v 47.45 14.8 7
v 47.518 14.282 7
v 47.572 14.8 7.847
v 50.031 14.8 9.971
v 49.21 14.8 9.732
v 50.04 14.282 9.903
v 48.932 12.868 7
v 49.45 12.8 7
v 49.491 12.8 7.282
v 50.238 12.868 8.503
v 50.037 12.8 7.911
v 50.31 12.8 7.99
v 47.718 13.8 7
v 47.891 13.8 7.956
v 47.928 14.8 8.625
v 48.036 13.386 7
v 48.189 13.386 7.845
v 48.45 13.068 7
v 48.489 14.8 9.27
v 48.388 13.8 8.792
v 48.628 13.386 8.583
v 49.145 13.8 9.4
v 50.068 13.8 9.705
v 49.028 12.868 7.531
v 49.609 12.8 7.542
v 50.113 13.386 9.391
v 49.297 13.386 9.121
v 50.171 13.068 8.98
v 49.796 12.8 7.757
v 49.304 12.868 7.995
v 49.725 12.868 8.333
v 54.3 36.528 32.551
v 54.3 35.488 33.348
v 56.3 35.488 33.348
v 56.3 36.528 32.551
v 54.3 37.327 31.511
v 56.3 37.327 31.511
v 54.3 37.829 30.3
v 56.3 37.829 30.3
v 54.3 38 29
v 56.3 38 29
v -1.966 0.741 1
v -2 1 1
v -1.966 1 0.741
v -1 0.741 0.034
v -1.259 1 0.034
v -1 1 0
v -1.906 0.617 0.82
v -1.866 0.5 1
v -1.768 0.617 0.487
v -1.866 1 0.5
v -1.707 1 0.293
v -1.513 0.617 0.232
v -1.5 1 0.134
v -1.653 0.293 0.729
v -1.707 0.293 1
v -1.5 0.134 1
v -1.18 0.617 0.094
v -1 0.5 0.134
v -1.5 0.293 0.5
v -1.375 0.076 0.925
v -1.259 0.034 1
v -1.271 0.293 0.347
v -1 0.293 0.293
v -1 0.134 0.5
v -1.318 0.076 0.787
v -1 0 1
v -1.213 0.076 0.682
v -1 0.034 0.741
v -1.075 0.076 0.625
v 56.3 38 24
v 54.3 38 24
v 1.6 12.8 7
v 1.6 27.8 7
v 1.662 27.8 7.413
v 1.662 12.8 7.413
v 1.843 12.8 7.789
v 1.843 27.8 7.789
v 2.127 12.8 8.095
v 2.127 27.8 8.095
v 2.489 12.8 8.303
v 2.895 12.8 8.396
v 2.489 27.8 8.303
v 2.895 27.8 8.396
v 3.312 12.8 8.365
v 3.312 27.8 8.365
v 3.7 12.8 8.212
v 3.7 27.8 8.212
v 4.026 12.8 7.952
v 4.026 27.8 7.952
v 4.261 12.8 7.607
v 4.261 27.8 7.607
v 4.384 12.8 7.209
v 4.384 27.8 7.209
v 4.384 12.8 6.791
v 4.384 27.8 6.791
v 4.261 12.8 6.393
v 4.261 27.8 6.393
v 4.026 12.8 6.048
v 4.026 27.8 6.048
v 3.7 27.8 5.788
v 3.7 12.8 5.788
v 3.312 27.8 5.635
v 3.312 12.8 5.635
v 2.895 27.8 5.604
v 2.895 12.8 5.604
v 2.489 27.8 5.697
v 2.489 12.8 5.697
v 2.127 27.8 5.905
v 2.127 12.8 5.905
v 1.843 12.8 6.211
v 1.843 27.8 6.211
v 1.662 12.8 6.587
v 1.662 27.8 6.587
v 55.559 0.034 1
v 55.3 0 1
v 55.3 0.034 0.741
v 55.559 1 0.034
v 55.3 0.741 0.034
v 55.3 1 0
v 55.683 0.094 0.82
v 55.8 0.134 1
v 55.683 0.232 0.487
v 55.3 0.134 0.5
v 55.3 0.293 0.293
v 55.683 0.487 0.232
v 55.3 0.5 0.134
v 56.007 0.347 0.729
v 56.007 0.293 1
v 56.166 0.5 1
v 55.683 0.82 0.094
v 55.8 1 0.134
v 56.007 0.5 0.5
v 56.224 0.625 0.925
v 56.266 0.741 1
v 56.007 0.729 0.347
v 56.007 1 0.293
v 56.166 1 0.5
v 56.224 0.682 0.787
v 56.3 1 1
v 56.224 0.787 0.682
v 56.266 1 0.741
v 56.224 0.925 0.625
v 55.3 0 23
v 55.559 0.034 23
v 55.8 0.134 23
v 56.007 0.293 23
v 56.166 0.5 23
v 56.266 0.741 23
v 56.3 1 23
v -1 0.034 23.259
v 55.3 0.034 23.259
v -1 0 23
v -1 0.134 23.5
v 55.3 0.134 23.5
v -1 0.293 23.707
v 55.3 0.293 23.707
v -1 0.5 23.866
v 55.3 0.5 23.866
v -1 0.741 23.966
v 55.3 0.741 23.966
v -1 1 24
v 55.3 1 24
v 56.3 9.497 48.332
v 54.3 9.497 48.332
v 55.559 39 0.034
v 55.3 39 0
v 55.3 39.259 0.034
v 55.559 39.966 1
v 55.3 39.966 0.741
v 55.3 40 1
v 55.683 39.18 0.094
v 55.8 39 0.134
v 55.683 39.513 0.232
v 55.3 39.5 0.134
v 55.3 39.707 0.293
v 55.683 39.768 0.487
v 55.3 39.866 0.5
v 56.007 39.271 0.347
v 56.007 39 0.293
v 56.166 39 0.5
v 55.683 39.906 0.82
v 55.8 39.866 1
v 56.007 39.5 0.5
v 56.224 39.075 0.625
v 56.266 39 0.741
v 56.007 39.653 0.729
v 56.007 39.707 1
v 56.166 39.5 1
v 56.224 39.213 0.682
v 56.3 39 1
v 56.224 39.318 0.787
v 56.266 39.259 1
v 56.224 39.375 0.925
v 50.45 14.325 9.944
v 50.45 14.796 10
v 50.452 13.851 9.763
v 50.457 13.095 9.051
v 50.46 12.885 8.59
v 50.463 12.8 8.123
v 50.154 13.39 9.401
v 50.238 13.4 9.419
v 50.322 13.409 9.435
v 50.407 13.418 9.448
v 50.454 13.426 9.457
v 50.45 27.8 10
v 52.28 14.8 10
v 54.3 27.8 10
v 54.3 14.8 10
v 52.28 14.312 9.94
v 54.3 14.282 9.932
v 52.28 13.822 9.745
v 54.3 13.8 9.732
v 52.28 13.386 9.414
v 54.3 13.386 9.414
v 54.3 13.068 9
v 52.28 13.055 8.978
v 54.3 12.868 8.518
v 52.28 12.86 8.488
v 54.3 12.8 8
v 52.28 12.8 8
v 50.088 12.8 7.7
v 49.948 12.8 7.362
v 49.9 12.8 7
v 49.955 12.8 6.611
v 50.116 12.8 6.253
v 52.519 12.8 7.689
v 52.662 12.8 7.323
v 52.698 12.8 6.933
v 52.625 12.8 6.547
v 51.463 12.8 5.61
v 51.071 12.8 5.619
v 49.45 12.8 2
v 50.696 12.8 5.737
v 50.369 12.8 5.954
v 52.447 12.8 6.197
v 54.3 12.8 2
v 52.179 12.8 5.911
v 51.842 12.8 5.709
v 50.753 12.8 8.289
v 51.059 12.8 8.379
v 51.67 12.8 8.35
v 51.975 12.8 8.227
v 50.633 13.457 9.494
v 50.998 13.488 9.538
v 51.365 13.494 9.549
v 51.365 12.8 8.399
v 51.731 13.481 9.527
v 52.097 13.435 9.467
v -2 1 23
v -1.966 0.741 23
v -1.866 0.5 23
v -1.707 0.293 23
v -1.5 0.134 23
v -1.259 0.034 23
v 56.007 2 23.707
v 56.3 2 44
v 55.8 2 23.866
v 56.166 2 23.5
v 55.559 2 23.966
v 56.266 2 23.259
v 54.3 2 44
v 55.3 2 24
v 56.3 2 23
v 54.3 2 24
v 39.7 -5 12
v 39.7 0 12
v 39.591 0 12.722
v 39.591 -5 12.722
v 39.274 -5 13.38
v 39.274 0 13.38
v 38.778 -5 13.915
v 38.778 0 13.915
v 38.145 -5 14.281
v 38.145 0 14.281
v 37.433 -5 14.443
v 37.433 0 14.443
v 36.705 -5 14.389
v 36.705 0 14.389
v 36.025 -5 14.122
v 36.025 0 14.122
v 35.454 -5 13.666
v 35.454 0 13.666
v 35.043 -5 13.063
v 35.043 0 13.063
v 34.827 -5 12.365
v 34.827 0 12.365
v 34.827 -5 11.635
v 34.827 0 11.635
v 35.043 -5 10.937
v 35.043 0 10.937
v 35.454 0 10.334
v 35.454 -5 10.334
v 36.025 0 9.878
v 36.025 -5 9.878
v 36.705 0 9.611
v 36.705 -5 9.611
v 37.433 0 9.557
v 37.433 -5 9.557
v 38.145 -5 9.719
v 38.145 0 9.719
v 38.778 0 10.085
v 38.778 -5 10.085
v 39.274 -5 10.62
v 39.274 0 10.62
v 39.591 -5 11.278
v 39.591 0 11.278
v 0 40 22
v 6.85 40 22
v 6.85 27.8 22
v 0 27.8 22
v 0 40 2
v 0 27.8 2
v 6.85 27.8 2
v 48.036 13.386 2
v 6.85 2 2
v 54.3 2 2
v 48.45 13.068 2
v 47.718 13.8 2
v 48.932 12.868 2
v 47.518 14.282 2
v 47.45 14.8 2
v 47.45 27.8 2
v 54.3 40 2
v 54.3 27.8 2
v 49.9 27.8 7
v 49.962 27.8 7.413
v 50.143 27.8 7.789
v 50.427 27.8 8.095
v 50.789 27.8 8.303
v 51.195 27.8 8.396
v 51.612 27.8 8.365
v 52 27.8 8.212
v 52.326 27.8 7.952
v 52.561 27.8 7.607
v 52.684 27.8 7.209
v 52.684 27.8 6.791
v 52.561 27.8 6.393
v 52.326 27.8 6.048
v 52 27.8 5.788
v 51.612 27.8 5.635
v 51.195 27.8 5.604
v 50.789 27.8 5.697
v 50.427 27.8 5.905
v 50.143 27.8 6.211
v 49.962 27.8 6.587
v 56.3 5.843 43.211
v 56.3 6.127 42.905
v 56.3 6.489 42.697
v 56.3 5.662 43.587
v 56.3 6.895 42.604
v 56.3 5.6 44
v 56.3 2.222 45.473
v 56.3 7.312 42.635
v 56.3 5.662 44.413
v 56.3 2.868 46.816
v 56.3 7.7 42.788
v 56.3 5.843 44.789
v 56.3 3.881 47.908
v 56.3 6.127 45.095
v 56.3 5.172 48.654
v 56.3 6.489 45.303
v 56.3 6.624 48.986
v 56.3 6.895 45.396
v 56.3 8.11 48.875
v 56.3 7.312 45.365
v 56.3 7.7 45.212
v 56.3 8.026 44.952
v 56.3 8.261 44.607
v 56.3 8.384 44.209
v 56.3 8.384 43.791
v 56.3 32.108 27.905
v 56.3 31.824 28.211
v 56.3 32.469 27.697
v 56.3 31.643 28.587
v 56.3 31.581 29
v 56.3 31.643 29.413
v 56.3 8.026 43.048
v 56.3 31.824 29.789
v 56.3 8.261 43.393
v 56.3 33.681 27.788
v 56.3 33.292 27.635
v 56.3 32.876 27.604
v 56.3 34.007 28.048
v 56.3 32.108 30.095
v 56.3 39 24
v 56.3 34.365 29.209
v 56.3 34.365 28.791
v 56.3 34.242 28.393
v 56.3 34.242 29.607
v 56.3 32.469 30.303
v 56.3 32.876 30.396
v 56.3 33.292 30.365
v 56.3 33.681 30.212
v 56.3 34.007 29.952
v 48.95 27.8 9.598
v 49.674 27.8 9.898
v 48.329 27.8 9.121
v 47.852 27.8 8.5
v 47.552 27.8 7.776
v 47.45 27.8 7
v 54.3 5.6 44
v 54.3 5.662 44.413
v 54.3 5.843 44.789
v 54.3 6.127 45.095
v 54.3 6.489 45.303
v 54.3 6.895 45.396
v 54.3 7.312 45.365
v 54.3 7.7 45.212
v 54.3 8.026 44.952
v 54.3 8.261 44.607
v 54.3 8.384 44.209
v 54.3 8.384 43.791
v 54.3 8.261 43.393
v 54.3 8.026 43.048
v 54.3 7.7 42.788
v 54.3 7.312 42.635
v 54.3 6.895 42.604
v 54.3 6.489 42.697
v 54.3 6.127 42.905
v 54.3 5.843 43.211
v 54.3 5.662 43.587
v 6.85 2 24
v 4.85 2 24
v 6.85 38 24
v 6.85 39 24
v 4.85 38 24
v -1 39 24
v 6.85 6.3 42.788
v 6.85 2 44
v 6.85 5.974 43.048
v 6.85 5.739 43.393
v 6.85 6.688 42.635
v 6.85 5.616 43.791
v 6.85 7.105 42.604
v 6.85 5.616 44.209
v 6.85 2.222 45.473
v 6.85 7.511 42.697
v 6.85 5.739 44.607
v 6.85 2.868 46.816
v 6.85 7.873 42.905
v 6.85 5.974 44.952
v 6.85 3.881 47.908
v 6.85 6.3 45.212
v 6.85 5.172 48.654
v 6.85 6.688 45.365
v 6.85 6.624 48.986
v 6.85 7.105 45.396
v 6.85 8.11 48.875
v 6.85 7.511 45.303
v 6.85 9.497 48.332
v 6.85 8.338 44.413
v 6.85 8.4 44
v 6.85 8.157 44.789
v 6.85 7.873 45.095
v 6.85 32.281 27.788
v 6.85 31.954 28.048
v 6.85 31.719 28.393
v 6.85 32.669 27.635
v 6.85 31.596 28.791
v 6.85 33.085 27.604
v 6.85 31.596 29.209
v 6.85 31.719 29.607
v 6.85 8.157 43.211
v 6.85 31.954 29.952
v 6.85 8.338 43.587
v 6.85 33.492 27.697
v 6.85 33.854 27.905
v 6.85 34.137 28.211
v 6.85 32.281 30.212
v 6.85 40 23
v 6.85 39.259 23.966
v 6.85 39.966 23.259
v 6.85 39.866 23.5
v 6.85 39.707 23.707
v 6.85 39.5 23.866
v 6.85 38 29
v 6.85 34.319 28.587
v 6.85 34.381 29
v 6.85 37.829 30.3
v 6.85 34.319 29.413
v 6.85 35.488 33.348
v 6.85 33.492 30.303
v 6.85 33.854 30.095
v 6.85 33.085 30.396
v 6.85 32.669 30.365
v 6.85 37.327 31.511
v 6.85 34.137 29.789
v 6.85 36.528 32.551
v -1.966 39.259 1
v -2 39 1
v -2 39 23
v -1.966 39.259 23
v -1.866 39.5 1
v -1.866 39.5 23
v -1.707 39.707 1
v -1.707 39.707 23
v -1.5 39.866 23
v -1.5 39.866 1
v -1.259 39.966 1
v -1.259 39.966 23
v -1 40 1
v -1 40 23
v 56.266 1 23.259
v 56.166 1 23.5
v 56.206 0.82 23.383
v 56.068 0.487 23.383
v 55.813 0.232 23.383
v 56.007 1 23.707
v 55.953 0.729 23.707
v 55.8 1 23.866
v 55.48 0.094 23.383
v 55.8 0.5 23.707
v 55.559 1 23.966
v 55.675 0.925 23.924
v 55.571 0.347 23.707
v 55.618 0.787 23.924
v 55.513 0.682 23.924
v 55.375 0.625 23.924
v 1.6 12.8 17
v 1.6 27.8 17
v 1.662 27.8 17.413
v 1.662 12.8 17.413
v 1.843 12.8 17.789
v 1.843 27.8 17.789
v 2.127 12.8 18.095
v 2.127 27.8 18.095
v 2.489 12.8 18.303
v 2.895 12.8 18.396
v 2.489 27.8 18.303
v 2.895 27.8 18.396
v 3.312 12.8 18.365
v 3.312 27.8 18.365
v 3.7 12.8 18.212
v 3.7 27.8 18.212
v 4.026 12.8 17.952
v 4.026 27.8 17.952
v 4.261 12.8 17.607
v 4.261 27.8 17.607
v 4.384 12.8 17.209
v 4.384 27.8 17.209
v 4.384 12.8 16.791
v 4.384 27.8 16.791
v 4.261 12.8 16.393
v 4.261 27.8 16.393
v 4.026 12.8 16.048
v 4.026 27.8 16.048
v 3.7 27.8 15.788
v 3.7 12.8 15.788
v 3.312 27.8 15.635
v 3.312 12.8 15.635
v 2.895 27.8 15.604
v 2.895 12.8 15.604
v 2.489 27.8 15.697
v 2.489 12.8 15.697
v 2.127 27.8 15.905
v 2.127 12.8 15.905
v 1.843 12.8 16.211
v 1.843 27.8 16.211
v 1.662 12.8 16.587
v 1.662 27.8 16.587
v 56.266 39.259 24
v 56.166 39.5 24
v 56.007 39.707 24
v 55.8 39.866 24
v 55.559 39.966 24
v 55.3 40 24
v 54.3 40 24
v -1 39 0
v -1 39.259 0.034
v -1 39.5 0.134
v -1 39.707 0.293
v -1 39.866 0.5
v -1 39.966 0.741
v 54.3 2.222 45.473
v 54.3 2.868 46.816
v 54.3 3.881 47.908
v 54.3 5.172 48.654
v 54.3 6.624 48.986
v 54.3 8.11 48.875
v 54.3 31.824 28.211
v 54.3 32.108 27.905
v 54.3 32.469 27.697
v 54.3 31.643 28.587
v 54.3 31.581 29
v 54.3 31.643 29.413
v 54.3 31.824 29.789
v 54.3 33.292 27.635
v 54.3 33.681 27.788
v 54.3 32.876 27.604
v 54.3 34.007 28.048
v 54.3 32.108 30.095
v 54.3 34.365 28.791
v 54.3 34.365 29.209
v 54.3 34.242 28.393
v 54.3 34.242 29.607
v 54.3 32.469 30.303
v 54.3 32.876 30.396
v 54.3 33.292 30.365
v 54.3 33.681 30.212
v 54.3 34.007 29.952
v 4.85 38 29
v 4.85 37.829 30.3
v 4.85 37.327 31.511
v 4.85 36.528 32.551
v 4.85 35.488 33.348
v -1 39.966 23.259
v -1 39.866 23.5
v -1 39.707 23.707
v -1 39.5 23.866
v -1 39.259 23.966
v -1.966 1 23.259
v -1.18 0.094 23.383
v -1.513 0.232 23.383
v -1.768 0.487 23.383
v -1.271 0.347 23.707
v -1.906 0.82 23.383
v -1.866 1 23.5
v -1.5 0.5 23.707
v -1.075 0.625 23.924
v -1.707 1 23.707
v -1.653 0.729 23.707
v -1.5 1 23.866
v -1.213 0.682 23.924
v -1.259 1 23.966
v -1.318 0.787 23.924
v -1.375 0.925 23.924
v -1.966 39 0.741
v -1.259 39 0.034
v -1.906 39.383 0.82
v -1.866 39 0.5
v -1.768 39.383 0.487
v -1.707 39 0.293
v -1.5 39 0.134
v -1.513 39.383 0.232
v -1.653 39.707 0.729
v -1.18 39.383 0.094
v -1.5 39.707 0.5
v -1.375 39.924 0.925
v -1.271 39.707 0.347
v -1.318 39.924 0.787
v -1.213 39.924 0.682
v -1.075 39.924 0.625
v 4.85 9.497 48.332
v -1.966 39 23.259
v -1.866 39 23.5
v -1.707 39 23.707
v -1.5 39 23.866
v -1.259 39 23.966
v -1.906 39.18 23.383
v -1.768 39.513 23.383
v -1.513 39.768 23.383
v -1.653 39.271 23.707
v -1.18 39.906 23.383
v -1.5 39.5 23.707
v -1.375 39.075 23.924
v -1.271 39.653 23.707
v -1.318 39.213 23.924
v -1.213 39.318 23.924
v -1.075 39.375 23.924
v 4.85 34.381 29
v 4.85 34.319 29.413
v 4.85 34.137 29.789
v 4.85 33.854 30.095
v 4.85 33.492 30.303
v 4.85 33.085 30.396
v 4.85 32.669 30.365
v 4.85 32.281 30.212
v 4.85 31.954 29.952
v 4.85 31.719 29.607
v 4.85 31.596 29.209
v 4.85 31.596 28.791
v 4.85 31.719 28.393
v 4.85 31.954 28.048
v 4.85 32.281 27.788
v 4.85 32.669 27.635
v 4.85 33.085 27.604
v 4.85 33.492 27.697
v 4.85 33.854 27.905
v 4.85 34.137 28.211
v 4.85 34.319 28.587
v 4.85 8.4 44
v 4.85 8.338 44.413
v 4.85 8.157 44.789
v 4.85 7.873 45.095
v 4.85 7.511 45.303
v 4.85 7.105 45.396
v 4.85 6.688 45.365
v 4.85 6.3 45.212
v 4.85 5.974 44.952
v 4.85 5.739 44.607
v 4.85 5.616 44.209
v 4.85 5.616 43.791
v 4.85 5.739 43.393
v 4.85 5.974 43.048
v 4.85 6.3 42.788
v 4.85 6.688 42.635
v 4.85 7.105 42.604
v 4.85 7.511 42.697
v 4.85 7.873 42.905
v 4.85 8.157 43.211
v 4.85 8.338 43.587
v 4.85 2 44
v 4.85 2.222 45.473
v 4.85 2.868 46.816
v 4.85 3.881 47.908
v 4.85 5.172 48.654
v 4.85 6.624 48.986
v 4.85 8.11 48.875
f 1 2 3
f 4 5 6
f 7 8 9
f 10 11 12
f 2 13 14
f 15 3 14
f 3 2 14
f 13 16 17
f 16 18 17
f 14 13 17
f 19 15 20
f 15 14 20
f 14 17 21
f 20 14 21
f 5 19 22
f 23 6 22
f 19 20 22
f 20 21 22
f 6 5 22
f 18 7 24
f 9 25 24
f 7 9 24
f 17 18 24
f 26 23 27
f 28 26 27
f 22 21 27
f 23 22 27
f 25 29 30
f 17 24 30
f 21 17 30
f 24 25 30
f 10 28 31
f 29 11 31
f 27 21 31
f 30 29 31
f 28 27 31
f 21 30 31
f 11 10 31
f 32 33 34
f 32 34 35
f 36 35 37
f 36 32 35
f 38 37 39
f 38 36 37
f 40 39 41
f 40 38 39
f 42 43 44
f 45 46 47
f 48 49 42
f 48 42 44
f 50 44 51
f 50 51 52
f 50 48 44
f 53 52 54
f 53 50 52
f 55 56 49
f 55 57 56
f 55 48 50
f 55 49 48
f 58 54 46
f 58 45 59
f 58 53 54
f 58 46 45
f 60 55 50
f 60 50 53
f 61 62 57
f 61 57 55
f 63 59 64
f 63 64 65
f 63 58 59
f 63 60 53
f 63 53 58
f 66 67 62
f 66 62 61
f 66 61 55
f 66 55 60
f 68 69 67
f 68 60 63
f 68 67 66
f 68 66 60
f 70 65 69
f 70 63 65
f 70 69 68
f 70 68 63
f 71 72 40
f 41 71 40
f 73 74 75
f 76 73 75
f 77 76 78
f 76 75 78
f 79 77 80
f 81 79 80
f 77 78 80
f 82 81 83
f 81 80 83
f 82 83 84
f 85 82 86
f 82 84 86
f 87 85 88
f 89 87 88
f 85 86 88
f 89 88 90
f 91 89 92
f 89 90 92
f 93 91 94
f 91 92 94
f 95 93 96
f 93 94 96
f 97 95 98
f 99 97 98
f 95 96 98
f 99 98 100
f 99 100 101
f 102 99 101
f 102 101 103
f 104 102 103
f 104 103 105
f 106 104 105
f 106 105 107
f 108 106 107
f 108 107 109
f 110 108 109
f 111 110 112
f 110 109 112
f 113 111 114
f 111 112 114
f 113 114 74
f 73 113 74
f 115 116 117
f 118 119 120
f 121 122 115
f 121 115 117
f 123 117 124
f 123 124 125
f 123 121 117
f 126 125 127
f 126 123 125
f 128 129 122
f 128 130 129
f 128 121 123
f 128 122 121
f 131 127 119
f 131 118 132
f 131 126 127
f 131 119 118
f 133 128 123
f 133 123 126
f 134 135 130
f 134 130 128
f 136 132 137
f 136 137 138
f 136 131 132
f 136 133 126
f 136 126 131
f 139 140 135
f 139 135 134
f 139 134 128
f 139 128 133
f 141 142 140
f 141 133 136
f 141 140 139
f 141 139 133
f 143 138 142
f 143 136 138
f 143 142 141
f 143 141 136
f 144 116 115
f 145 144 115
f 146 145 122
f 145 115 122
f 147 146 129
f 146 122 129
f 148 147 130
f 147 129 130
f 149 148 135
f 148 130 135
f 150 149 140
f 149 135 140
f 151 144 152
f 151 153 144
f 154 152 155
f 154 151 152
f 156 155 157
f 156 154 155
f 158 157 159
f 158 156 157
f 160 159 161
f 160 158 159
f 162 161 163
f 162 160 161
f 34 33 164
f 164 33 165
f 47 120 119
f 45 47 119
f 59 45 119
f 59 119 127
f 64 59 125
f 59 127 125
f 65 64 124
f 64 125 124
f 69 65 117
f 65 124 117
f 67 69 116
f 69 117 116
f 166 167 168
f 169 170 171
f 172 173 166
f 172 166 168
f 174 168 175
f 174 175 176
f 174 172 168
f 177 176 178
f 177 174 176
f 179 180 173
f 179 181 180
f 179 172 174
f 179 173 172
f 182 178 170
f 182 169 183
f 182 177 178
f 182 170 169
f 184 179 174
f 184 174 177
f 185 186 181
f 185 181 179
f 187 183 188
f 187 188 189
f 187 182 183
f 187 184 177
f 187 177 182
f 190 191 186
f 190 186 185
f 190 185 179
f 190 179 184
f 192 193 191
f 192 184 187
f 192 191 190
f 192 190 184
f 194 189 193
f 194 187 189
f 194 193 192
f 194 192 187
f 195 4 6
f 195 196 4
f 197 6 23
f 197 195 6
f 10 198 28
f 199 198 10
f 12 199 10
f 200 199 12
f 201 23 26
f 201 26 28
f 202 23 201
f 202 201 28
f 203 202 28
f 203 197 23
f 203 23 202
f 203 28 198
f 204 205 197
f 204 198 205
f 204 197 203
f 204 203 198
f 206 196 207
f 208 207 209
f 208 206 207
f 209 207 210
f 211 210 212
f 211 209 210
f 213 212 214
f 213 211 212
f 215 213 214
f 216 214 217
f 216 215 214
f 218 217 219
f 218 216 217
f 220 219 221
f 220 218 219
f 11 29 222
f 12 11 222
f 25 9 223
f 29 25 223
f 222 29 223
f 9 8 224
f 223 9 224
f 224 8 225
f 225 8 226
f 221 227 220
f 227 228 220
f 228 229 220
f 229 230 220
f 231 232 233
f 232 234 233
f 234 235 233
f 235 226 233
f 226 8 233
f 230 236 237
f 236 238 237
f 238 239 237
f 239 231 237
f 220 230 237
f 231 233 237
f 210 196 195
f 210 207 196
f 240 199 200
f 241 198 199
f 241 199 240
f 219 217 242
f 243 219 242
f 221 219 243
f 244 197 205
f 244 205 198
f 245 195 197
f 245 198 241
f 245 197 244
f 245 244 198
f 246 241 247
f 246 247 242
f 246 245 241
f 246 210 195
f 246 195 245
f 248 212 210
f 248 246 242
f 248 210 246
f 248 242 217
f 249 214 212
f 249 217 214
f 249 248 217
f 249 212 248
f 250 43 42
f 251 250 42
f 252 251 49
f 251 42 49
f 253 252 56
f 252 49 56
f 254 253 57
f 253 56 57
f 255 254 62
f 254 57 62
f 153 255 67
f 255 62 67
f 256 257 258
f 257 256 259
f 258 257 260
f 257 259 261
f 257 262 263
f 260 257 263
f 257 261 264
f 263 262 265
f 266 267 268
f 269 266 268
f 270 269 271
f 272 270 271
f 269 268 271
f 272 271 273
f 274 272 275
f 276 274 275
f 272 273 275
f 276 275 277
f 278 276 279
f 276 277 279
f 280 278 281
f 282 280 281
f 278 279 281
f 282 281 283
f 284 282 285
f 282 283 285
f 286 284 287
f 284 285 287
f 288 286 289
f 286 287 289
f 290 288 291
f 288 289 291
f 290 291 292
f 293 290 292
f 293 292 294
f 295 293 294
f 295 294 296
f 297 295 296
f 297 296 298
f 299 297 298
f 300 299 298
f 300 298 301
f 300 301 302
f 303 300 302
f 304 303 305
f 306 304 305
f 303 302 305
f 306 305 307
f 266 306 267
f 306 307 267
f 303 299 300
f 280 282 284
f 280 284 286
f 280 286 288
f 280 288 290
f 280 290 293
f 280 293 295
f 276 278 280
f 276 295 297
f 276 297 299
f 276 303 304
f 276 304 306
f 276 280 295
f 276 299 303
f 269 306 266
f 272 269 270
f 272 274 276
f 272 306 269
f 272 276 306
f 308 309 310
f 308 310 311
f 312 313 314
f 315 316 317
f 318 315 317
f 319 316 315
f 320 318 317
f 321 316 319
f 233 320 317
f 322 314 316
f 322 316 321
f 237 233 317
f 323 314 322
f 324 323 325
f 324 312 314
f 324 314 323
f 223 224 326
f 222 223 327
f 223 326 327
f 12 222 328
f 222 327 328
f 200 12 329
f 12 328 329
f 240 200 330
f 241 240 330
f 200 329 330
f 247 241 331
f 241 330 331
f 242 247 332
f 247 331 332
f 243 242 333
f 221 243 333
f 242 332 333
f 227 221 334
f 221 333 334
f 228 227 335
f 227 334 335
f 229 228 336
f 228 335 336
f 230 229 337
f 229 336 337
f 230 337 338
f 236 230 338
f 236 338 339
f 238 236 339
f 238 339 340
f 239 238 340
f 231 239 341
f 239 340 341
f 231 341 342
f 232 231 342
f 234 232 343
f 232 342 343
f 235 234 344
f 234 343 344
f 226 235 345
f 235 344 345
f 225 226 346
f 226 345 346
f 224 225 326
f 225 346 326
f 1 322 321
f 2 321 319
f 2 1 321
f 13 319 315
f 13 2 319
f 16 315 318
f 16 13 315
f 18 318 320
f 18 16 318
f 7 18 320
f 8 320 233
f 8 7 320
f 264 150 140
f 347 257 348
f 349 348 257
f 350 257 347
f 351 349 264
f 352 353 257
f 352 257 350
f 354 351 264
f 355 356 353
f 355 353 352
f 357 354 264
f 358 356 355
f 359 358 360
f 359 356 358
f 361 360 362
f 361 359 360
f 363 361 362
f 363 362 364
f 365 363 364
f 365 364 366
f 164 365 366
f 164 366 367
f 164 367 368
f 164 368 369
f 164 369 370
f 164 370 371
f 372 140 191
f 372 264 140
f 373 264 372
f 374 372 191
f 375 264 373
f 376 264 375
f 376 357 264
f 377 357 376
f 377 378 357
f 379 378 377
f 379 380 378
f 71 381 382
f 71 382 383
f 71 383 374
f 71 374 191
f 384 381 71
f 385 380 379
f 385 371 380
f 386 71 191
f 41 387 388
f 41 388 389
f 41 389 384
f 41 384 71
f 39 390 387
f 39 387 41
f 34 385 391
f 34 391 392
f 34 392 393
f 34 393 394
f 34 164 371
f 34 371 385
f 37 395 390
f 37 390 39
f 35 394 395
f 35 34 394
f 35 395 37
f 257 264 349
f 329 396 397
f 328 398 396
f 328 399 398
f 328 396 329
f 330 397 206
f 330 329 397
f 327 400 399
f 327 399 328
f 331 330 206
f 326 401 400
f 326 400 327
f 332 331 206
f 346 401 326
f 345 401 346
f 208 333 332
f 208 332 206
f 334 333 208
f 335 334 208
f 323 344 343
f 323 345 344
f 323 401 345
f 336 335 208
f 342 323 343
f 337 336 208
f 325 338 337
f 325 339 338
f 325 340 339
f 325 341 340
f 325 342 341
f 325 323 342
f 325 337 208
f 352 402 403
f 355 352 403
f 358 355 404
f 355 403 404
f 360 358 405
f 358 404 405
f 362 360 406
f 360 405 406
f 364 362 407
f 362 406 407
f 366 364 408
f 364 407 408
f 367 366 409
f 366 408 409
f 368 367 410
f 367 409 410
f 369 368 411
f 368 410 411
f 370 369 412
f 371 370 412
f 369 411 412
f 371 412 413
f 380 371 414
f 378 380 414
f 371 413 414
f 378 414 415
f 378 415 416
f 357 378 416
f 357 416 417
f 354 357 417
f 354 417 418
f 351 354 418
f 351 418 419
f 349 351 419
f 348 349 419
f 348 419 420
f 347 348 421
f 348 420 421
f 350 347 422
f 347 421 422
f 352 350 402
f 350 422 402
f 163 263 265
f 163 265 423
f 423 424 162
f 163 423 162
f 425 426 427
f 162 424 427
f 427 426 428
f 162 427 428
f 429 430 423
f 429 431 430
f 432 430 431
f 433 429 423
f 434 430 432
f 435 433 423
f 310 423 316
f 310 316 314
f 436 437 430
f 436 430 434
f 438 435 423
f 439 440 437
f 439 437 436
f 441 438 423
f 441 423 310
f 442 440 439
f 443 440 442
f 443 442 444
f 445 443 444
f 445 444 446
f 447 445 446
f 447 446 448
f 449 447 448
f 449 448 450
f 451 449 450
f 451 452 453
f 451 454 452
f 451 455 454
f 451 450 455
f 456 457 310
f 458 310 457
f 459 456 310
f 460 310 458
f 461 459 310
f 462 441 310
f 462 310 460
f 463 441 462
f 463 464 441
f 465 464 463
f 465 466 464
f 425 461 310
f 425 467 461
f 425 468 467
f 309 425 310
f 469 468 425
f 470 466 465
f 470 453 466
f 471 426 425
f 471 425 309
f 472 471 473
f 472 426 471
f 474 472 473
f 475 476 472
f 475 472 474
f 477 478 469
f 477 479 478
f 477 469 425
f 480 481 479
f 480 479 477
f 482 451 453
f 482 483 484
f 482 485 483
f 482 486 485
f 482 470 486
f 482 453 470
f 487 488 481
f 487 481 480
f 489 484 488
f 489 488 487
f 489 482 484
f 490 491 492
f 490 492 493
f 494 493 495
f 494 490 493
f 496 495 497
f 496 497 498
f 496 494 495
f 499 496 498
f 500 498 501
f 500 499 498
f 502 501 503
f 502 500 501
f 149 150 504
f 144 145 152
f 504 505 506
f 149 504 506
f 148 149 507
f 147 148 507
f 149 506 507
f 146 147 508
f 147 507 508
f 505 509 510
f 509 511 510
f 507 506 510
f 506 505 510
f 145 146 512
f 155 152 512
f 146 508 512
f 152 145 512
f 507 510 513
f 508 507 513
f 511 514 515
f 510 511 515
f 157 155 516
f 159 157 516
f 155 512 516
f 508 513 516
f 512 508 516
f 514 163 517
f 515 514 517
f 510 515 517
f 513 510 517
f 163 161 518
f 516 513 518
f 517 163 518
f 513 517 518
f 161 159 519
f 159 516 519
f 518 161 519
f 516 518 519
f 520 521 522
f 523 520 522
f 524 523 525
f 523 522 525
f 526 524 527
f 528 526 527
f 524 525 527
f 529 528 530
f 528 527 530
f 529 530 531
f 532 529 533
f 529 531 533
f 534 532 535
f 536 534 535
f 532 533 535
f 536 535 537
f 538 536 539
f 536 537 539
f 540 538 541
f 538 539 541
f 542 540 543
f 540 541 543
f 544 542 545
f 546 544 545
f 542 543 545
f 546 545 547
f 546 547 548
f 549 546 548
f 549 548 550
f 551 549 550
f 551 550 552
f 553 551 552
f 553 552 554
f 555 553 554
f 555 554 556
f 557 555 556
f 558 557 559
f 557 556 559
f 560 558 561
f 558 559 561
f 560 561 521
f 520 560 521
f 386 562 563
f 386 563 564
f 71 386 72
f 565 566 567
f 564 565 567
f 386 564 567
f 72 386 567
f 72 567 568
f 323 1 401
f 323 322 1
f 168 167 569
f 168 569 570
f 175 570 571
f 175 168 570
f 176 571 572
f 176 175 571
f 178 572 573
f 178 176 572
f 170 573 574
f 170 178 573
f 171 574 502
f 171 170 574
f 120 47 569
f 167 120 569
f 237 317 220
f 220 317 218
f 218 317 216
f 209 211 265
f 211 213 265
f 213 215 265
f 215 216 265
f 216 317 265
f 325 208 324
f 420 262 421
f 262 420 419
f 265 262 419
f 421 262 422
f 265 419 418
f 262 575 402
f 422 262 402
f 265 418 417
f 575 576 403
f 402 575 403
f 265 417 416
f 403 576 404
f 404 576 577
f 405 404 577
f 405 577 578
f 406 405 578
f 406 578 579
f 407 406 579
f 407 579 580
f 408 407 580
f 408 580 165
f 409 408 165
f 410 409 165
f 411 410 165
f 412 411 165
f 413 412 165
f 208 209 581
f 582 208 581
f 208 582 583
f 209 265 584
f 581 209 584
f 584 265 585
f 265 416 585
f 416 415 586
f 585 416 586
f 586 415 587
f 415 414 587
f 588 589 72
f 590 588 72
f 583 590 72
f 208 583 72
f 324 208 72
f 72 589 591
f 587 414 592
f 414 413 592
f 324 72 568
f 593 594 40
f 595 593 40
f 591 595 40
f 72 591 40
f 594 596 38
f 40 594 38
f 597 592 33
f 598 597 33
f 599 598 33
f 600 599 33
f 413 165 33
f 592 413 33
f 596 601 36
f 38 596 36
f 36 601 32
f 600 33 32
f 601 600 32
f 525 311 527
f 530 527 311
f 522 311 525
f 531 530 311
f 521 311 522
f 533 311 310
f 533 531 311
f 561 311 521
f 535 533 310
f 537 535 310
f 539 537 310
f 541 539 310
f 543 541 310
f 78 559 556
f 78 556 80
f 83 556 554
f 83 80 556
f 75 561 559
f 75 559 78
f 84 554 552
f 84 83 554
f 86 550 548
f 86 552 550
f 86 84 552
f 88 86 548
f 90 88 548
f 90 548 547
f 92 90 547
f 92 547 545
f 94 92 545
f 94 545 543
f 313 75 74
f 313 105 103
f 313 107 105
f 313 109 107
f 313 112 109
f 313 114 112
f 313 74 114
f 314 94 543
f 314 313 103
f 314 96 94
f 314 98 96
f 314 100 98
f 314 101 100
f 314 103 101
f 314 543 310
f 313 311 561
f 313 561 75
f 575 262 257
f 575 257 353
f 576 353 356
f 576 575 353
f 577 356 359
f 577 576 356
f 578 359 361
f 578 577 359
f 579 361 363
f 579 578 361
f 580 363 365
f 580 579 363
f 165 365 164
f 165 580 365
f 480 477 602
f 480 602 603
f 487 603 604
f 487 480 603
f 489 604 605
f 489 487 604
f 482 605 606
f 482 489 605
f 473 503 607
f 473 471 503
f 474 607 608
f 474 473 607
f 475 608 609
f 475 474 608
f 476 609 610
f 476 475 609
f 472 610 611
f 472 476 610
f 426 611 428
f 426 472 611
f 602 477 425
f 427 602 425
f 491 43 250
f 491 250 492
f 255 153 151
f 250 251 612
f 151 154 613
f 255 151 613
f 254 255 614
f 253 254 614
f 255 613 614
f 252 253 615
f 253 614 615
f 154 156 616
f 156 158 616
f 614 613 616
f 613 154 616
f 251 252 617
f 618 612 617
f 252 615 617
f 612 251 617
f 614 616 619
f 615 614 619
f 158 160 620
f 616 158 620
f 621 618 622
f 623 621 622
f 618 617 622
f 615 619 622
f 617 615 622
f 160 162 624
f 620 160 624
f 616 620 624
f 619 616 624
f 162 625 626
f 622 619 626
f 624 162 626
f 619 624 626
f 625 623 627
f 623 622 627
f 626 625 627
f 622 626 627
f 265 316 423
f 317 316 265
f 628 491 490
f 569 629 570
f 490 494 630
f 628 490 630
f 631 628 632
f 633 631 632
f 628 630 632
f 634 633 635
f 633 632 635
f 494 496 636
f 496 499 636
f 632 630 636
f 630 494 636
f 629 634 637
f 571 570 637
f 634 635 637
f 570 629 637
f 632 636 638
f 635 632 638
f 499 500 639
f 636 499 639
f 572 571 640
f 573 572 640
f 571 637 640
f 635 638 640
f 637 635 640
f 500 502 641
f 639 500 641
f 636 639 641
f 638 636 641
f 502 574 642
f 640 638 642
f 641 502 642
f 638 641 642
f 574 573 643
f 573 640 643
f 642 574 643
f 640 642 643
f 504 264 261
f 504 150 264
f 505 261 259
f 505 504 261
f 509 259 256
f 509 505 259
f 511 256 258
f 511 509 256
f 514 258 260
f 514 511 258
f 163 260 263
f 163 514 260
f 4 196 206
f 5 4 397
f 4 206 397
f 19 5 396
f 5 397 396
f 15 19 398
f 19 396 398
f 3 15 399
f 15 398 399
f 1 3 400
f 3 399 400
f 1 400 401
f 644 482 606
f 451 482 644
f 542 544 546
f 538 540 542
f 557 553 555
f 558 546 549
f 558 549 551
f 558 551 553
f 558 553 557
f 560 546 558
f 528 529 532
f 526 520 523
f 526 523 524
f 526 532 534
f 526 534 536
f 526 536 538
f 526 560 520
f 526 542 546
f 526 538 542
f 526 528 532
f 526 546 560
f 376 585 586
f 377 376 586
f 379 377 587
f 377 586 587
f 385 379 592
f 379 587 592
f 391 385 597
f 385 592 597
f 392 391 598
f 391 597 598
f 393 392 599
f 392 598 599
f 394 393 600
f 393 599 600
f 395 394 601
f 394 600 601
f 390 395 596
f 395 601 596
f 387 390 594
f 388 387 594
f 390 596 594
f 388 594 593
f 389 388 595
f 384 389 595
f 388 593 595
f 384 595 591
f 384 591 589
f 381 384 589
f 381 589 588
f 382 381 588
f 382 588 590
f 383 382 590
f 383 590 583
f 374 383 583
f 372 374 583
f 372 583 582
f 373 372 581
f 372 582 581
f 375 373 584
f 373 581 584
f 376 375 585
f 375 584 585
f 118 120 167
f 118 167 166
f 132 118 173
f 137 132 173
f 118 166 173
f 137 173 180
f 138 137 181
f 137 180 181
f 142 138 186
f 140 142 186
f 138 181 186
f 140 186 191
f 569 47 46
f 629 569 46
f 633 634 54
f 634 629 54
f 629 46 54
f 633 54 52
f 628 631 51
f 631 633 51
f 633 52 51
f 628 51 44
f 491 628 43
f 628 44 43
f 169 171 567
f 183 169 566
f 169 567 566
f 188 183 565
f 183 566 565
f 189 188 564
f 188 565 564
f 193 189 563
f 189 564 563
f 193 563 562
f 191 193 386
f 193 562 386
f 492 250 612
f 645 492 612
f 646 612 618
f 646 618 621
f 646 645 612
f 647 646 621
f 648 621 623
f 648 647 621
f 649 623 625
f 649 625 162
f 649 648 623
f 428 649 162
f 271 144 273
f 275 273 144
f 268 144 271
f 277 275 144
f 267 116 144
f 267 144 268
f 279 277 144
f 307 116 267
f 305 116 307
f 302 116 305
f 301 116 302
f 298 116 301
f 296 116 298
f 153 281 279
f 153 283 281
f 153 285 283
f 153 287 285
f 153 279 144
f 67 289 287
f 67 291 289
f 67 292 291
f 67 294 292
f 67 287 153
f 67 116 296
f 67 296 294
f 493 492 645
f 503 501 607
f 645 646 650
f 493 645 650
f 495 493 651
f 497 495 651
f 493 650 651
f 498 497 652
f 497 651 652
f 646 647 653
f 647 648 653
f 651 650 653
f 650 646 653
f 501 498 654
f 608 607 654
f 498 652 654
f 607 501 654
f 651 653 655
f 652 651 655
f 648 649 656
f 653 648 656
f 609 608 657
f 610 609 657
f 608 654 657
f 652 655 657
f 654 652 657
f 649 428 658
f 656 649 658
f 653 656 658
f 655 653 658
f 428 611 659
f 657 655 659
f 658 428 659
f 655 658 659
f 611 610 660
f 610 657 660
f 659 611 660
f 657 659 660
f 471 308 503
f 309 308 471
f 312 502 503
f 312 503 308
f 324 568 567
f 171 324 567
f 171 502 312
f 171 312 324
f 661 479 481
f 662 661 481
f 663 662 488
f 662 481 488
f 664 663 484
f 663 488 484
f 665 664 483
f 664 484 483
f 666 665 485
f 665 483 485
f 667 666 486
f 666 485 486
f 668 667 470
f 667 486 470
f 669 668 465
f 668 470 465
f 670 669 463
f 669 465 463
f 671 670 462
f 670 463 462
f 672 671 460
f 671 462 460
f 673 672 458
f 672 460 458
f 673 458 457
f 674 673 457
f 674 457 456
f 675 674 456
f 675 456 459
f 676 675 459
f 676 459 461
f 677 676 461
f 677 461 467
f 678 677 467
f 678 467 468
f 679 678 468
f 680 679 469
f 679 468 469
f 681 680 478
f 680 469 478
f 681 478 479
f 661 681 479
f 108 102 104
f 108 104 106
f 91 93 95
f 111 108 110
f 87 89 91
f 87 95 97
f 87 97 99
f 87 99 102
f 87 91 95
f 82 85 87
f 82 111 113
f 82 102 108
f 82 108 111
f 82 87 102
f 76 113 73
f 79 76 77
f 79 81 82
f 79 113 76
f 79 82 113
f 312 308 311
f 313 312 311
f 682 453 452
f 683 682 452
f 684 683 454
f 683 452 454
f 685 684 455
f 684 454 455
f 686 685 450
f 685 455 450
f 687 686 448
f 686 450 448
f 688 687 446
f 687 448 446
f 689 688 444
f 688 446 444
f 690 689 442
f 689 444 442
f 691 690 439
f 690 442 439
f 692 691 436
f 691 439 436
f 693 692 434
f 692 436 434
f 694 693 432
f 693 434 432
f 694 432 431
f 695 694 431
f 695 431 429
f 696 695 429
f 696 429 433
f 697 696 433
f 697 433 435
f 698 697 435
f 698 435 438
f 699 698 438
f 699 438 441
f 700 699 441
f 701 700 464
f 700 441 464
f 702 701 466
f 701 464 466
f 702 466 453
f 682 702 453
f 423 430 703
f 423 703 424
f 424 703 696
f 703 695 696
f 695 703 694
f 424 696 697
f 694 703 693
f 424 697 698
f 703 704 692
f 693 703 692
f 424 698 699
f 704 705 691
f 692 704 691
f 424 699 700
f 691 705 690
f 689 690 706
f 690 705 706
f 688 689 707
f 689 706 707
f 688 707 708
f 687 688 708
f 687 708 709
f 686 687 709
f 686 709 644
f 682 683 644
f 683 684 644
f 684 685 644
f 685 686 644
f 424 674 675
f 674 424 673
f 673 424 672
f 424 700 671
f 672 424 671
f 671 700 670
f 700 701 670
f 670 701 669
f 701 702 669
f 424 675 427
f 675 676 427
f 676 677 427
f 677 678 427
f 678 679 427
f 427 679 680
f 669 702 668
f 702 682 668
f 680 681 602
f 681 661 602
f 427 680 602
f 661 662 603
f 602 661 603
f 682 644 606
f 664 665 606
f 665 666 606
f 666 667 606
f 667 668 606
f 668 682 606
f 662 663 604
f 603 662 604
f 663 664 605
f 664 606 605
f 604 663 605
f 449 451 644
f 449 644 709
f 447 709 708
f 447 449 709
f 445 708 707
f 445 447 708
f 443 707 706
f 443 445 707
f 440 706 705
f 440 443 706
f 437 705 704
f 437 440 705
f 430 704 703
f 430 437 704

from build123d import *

# Parameters (mm, degrees)
SKETCH_W        = 54.3
SKETCH_H        = 38
PAD_DEPTH       = 2
SKETCH001_W     = 54.3
SKETCH001_H     = 2
PAD001_DEPTH    = 22
SKETCH002_R     = 2.45
PAD002_DEPTH    = 5
SKETCH003_W     = 40
SKETCH003_H     = 22
PAD003_DEPTH    = 2
SKETCH004_W     = 40
SKETCH004_H     = 22
PAD004_DEPTH    = 2
SKETCH005_W     = 6.85
SKETCH005_H     = 15
PAD005_DEPTH    = 8
SKETCH006_R     = 1.4
POCKET_DEPTH    = 15
FILLET_R        = 3
FILLET001_R     = 2
SKETCH007_W     = 6.85
SKETCH007_H     = 25.8
PAD006_DEPTH    = 20
SKETCH008_R     = 1.4
POCKET001_DEPTH = 15
PAD007_DEPTH    = 2
SKETCH010_R     = 1.4
PAD008_DEPTH    = 2
SKETCH011_R     = 1.4
PAD009_DEPTH    = 2
FILLET002_R     = 1
FILLET003_R     = 1
FILLET004_R     = 1
FILLET005_R     = 1
FILLET006_R     = 1


with BuildPart() as part:
    # Sketch → Pad (new body)
    with BuildSketch(Plane.XY):
        with Locations((27.15, 21)):
            Rectangle(SKETCH_W, SKETCH_H)
    extrude(amount=PAD_DEPTH)

    # Sketch001 → Pad001 (join)
    with BuildSketch(Plane.XY):
        with Locations((27.15, 1)):
            Rectangle(SKETCH001_W, SKETCH001_H)
    extrude(amount=PAD001_DEPTH)

    # Sketch002 → Pad002 (join)
    with BuildSketch(Plane.XZ):
        with Locations((37.25, 12)):
            Circle(SKETCH002_R)
    extrude(amount=PAD002_DEPTH)

    # Sketch003 (on Face2 of Pad002) → Pad003 (join)
    with BuildSketch(Plane(origin=(0, 0, 0), x_dir=(0, -1, 0), z_dir=(-1, 0, 0))):
        with Locations((-20, 11)):
            Rectangle(SKETCH003_W, SKETCH003_H)
    extrude(amount=PAD003_DEPTH)

    # Sketch004 (on Face3 of Pad003) → Pad004 (join)
    with BuildSketch(Plane.YZ.offset(54.3)):
        with Locations((20, 11)):
            Rectangle(SKETCH004_W, SKETCH004_H)
    extrude(amount=PAD004_DEPTH)

    # Sketch005 (on Face5 of Pad004) → Pad005 (join)
    with BuildSketch(Plane.XY.offset(2)):
        with Locations((50.875, 20.3)):
            Rectangle(SKETCH005_W, SKETCH005_H)
    extrude(amount=PAD005_DEPTH)

    # Sketch006 (on Face15 of Pad005) → Pocket (cut)
    with BuildSketch(Plane(origin=(0, 27.8, 0), x_dir=(-1, 0, 0), z_dir=(0, 1, 0))):
        with Locations((-51.3, 7)):
            Circle(SKETCH006_R)
    extrude(amount=-POCKET_DEPTH, mode=Mode.SUBTRACT)

    # Fillet
    fillet_edges = [part.edges().sort_by_distance(p)[0] for p in [
        (47.45, 20.3, 10),
    ]]
    fillet(fillet_edges, radius=FILLET_R)

    # Fillet001
    fillet001_edges = [part.edges().sort_by_distance(p)[0] for p in [
        (52.375, 12.8, 10),
    ]]
    fillet(fillet001_edges, radius=FILLET001_R)

    # Sketch007 (on Face5 of Fillet001) → Pad006 (join)
    with BuildSketch(Plane.XY.offset(2)):
        with Locations((3.425, 14.9)):
            Rectangle(SKETCH007_W, SKETCH007_H)
    extrude(amount=PAD006_DEPTH)

    # Sketch008 (on Face14 of Pad006) → Pocket001 (cut)
    with BuildSketch(Plane(origin=(0, 27.8, 0), x_dir=(-1, 0, 0), z_dir=(0, 1, 0))):
        with Locations((-3, 7)):
            Circle(SKETCH008_R)
        with Locations((-3, 17)):
            Circle(SKETCH008_R)
    extrude(amount=-POCKET001_DEPTH, mode=Mode.SUBTRACT)

    # Sketch009 (on Face21 of Pocket001) → Pad007 (join)
    with BuildSketch(Plane.XY.offset(22)):
        Polygon((54.3, 2), (54.3, 40), (56.3, 40), (56.3, 0), (-2, 0), (-2, 40), (6.85, 40), (6.85, 2), align=None)
    extrude(amount=PAD007_DEPTH)

    # Sketch010 (on Face22 of Pad007) → Pad008 (join)
    with BuildSketch(Plane.YZ.offset(6.85)):
        with BuildLine():
            Line((2, 24), (38, 24))
            Line((38, 29), (38, 24))
            ThreePointArc((38, 29), (37.326745, 31.511013), (35.487593, 33.348396))
            Line((35.487593, 33.348396), (9.497223, 48.331729))
            ThreePointArc((9.497223, 48.331729), (4.498612, 48.329325), (2, 44))
            Line((2, 44), (2, 24))
        make_face()
        with Locations((7, 44)):
            Circle(SKETCH010_R, mode=Mode.SUBTRACT)
        with Locations((32.980762, 29)):
            Circle(SKETCH010_R, mode=Mode.SUBTRACT)
    extrude(amount=-PAD008_DEPTH)

    # Sketch011 (on Face20 of Pad008) → Pad009 (join)
    with BuildSketch(Plane(origin=(54.3, 0, 0), x_dir=(0, -1, 0), z_dir=(-1, 0, 0))):
        with BuildLine():
            Line((-38, 24), (-38, 29))
            ThreePointArc((-35.487593, 33.348396), (-37.326745, 31.511013), (-38, 29))
            Line((-35.487593, 33.348396), (-9.497223, 48.331729))
            ThreePointArc((-2, 44), (-4.498612, 48.329325), (-9.497223, 48.331729))
            Line((-2, 44), (-2, 24))
            Line((-2, 24), (-38, 24))
        make_face()
        with Locations((-7, 44)):
            Circle(SKETCH011_R, mode=Mode.SUBTRACT)
        with Locations((-32.980762, 29)):
            Circle(SKETCH011_R, mode=Mode.SUBTRACT)
    extrude(amount=-PAD009_DEPTH)

    # Fillet002
    fillet002_edges = [part.edges().sort_by_distance(p)[0] for p in [
        (-2, 20, 0),
    ]]
    fillet(fillet002_edges, radius=FILLET002_R)

    # Fillet003
    fillet003_edges = [part.edges().sort_by_distance(p)[0] for p in [
        (27.15, 0, 0),
    ]]
    fillet(fillet003_edges, radius=FILLET003_R)

    # Fillet004
    fillet004_edges = [part.edges().sort_by_distance(p)[0] for p in [
        (27.15, 40, 0),
    ]]
    fillet(fillet004_edges, radius=FILLET004_R)

    # Fillet005
    fillet005_edges = [part.edges().sort_by_distance(p)[0] for p in [
        (56.3, 20, 0),
    ]]
    fillet(fillet005_edges, radius=FILLET005_R)

    # Fillet006
    fillet006_edges = [part.edges().sort_by_distance(p)[0] for p in [
        (27.15, 0, 24),
    ]]
    fillet(fillet006_edges, radius=FILLET006_R)


solid = part.part
